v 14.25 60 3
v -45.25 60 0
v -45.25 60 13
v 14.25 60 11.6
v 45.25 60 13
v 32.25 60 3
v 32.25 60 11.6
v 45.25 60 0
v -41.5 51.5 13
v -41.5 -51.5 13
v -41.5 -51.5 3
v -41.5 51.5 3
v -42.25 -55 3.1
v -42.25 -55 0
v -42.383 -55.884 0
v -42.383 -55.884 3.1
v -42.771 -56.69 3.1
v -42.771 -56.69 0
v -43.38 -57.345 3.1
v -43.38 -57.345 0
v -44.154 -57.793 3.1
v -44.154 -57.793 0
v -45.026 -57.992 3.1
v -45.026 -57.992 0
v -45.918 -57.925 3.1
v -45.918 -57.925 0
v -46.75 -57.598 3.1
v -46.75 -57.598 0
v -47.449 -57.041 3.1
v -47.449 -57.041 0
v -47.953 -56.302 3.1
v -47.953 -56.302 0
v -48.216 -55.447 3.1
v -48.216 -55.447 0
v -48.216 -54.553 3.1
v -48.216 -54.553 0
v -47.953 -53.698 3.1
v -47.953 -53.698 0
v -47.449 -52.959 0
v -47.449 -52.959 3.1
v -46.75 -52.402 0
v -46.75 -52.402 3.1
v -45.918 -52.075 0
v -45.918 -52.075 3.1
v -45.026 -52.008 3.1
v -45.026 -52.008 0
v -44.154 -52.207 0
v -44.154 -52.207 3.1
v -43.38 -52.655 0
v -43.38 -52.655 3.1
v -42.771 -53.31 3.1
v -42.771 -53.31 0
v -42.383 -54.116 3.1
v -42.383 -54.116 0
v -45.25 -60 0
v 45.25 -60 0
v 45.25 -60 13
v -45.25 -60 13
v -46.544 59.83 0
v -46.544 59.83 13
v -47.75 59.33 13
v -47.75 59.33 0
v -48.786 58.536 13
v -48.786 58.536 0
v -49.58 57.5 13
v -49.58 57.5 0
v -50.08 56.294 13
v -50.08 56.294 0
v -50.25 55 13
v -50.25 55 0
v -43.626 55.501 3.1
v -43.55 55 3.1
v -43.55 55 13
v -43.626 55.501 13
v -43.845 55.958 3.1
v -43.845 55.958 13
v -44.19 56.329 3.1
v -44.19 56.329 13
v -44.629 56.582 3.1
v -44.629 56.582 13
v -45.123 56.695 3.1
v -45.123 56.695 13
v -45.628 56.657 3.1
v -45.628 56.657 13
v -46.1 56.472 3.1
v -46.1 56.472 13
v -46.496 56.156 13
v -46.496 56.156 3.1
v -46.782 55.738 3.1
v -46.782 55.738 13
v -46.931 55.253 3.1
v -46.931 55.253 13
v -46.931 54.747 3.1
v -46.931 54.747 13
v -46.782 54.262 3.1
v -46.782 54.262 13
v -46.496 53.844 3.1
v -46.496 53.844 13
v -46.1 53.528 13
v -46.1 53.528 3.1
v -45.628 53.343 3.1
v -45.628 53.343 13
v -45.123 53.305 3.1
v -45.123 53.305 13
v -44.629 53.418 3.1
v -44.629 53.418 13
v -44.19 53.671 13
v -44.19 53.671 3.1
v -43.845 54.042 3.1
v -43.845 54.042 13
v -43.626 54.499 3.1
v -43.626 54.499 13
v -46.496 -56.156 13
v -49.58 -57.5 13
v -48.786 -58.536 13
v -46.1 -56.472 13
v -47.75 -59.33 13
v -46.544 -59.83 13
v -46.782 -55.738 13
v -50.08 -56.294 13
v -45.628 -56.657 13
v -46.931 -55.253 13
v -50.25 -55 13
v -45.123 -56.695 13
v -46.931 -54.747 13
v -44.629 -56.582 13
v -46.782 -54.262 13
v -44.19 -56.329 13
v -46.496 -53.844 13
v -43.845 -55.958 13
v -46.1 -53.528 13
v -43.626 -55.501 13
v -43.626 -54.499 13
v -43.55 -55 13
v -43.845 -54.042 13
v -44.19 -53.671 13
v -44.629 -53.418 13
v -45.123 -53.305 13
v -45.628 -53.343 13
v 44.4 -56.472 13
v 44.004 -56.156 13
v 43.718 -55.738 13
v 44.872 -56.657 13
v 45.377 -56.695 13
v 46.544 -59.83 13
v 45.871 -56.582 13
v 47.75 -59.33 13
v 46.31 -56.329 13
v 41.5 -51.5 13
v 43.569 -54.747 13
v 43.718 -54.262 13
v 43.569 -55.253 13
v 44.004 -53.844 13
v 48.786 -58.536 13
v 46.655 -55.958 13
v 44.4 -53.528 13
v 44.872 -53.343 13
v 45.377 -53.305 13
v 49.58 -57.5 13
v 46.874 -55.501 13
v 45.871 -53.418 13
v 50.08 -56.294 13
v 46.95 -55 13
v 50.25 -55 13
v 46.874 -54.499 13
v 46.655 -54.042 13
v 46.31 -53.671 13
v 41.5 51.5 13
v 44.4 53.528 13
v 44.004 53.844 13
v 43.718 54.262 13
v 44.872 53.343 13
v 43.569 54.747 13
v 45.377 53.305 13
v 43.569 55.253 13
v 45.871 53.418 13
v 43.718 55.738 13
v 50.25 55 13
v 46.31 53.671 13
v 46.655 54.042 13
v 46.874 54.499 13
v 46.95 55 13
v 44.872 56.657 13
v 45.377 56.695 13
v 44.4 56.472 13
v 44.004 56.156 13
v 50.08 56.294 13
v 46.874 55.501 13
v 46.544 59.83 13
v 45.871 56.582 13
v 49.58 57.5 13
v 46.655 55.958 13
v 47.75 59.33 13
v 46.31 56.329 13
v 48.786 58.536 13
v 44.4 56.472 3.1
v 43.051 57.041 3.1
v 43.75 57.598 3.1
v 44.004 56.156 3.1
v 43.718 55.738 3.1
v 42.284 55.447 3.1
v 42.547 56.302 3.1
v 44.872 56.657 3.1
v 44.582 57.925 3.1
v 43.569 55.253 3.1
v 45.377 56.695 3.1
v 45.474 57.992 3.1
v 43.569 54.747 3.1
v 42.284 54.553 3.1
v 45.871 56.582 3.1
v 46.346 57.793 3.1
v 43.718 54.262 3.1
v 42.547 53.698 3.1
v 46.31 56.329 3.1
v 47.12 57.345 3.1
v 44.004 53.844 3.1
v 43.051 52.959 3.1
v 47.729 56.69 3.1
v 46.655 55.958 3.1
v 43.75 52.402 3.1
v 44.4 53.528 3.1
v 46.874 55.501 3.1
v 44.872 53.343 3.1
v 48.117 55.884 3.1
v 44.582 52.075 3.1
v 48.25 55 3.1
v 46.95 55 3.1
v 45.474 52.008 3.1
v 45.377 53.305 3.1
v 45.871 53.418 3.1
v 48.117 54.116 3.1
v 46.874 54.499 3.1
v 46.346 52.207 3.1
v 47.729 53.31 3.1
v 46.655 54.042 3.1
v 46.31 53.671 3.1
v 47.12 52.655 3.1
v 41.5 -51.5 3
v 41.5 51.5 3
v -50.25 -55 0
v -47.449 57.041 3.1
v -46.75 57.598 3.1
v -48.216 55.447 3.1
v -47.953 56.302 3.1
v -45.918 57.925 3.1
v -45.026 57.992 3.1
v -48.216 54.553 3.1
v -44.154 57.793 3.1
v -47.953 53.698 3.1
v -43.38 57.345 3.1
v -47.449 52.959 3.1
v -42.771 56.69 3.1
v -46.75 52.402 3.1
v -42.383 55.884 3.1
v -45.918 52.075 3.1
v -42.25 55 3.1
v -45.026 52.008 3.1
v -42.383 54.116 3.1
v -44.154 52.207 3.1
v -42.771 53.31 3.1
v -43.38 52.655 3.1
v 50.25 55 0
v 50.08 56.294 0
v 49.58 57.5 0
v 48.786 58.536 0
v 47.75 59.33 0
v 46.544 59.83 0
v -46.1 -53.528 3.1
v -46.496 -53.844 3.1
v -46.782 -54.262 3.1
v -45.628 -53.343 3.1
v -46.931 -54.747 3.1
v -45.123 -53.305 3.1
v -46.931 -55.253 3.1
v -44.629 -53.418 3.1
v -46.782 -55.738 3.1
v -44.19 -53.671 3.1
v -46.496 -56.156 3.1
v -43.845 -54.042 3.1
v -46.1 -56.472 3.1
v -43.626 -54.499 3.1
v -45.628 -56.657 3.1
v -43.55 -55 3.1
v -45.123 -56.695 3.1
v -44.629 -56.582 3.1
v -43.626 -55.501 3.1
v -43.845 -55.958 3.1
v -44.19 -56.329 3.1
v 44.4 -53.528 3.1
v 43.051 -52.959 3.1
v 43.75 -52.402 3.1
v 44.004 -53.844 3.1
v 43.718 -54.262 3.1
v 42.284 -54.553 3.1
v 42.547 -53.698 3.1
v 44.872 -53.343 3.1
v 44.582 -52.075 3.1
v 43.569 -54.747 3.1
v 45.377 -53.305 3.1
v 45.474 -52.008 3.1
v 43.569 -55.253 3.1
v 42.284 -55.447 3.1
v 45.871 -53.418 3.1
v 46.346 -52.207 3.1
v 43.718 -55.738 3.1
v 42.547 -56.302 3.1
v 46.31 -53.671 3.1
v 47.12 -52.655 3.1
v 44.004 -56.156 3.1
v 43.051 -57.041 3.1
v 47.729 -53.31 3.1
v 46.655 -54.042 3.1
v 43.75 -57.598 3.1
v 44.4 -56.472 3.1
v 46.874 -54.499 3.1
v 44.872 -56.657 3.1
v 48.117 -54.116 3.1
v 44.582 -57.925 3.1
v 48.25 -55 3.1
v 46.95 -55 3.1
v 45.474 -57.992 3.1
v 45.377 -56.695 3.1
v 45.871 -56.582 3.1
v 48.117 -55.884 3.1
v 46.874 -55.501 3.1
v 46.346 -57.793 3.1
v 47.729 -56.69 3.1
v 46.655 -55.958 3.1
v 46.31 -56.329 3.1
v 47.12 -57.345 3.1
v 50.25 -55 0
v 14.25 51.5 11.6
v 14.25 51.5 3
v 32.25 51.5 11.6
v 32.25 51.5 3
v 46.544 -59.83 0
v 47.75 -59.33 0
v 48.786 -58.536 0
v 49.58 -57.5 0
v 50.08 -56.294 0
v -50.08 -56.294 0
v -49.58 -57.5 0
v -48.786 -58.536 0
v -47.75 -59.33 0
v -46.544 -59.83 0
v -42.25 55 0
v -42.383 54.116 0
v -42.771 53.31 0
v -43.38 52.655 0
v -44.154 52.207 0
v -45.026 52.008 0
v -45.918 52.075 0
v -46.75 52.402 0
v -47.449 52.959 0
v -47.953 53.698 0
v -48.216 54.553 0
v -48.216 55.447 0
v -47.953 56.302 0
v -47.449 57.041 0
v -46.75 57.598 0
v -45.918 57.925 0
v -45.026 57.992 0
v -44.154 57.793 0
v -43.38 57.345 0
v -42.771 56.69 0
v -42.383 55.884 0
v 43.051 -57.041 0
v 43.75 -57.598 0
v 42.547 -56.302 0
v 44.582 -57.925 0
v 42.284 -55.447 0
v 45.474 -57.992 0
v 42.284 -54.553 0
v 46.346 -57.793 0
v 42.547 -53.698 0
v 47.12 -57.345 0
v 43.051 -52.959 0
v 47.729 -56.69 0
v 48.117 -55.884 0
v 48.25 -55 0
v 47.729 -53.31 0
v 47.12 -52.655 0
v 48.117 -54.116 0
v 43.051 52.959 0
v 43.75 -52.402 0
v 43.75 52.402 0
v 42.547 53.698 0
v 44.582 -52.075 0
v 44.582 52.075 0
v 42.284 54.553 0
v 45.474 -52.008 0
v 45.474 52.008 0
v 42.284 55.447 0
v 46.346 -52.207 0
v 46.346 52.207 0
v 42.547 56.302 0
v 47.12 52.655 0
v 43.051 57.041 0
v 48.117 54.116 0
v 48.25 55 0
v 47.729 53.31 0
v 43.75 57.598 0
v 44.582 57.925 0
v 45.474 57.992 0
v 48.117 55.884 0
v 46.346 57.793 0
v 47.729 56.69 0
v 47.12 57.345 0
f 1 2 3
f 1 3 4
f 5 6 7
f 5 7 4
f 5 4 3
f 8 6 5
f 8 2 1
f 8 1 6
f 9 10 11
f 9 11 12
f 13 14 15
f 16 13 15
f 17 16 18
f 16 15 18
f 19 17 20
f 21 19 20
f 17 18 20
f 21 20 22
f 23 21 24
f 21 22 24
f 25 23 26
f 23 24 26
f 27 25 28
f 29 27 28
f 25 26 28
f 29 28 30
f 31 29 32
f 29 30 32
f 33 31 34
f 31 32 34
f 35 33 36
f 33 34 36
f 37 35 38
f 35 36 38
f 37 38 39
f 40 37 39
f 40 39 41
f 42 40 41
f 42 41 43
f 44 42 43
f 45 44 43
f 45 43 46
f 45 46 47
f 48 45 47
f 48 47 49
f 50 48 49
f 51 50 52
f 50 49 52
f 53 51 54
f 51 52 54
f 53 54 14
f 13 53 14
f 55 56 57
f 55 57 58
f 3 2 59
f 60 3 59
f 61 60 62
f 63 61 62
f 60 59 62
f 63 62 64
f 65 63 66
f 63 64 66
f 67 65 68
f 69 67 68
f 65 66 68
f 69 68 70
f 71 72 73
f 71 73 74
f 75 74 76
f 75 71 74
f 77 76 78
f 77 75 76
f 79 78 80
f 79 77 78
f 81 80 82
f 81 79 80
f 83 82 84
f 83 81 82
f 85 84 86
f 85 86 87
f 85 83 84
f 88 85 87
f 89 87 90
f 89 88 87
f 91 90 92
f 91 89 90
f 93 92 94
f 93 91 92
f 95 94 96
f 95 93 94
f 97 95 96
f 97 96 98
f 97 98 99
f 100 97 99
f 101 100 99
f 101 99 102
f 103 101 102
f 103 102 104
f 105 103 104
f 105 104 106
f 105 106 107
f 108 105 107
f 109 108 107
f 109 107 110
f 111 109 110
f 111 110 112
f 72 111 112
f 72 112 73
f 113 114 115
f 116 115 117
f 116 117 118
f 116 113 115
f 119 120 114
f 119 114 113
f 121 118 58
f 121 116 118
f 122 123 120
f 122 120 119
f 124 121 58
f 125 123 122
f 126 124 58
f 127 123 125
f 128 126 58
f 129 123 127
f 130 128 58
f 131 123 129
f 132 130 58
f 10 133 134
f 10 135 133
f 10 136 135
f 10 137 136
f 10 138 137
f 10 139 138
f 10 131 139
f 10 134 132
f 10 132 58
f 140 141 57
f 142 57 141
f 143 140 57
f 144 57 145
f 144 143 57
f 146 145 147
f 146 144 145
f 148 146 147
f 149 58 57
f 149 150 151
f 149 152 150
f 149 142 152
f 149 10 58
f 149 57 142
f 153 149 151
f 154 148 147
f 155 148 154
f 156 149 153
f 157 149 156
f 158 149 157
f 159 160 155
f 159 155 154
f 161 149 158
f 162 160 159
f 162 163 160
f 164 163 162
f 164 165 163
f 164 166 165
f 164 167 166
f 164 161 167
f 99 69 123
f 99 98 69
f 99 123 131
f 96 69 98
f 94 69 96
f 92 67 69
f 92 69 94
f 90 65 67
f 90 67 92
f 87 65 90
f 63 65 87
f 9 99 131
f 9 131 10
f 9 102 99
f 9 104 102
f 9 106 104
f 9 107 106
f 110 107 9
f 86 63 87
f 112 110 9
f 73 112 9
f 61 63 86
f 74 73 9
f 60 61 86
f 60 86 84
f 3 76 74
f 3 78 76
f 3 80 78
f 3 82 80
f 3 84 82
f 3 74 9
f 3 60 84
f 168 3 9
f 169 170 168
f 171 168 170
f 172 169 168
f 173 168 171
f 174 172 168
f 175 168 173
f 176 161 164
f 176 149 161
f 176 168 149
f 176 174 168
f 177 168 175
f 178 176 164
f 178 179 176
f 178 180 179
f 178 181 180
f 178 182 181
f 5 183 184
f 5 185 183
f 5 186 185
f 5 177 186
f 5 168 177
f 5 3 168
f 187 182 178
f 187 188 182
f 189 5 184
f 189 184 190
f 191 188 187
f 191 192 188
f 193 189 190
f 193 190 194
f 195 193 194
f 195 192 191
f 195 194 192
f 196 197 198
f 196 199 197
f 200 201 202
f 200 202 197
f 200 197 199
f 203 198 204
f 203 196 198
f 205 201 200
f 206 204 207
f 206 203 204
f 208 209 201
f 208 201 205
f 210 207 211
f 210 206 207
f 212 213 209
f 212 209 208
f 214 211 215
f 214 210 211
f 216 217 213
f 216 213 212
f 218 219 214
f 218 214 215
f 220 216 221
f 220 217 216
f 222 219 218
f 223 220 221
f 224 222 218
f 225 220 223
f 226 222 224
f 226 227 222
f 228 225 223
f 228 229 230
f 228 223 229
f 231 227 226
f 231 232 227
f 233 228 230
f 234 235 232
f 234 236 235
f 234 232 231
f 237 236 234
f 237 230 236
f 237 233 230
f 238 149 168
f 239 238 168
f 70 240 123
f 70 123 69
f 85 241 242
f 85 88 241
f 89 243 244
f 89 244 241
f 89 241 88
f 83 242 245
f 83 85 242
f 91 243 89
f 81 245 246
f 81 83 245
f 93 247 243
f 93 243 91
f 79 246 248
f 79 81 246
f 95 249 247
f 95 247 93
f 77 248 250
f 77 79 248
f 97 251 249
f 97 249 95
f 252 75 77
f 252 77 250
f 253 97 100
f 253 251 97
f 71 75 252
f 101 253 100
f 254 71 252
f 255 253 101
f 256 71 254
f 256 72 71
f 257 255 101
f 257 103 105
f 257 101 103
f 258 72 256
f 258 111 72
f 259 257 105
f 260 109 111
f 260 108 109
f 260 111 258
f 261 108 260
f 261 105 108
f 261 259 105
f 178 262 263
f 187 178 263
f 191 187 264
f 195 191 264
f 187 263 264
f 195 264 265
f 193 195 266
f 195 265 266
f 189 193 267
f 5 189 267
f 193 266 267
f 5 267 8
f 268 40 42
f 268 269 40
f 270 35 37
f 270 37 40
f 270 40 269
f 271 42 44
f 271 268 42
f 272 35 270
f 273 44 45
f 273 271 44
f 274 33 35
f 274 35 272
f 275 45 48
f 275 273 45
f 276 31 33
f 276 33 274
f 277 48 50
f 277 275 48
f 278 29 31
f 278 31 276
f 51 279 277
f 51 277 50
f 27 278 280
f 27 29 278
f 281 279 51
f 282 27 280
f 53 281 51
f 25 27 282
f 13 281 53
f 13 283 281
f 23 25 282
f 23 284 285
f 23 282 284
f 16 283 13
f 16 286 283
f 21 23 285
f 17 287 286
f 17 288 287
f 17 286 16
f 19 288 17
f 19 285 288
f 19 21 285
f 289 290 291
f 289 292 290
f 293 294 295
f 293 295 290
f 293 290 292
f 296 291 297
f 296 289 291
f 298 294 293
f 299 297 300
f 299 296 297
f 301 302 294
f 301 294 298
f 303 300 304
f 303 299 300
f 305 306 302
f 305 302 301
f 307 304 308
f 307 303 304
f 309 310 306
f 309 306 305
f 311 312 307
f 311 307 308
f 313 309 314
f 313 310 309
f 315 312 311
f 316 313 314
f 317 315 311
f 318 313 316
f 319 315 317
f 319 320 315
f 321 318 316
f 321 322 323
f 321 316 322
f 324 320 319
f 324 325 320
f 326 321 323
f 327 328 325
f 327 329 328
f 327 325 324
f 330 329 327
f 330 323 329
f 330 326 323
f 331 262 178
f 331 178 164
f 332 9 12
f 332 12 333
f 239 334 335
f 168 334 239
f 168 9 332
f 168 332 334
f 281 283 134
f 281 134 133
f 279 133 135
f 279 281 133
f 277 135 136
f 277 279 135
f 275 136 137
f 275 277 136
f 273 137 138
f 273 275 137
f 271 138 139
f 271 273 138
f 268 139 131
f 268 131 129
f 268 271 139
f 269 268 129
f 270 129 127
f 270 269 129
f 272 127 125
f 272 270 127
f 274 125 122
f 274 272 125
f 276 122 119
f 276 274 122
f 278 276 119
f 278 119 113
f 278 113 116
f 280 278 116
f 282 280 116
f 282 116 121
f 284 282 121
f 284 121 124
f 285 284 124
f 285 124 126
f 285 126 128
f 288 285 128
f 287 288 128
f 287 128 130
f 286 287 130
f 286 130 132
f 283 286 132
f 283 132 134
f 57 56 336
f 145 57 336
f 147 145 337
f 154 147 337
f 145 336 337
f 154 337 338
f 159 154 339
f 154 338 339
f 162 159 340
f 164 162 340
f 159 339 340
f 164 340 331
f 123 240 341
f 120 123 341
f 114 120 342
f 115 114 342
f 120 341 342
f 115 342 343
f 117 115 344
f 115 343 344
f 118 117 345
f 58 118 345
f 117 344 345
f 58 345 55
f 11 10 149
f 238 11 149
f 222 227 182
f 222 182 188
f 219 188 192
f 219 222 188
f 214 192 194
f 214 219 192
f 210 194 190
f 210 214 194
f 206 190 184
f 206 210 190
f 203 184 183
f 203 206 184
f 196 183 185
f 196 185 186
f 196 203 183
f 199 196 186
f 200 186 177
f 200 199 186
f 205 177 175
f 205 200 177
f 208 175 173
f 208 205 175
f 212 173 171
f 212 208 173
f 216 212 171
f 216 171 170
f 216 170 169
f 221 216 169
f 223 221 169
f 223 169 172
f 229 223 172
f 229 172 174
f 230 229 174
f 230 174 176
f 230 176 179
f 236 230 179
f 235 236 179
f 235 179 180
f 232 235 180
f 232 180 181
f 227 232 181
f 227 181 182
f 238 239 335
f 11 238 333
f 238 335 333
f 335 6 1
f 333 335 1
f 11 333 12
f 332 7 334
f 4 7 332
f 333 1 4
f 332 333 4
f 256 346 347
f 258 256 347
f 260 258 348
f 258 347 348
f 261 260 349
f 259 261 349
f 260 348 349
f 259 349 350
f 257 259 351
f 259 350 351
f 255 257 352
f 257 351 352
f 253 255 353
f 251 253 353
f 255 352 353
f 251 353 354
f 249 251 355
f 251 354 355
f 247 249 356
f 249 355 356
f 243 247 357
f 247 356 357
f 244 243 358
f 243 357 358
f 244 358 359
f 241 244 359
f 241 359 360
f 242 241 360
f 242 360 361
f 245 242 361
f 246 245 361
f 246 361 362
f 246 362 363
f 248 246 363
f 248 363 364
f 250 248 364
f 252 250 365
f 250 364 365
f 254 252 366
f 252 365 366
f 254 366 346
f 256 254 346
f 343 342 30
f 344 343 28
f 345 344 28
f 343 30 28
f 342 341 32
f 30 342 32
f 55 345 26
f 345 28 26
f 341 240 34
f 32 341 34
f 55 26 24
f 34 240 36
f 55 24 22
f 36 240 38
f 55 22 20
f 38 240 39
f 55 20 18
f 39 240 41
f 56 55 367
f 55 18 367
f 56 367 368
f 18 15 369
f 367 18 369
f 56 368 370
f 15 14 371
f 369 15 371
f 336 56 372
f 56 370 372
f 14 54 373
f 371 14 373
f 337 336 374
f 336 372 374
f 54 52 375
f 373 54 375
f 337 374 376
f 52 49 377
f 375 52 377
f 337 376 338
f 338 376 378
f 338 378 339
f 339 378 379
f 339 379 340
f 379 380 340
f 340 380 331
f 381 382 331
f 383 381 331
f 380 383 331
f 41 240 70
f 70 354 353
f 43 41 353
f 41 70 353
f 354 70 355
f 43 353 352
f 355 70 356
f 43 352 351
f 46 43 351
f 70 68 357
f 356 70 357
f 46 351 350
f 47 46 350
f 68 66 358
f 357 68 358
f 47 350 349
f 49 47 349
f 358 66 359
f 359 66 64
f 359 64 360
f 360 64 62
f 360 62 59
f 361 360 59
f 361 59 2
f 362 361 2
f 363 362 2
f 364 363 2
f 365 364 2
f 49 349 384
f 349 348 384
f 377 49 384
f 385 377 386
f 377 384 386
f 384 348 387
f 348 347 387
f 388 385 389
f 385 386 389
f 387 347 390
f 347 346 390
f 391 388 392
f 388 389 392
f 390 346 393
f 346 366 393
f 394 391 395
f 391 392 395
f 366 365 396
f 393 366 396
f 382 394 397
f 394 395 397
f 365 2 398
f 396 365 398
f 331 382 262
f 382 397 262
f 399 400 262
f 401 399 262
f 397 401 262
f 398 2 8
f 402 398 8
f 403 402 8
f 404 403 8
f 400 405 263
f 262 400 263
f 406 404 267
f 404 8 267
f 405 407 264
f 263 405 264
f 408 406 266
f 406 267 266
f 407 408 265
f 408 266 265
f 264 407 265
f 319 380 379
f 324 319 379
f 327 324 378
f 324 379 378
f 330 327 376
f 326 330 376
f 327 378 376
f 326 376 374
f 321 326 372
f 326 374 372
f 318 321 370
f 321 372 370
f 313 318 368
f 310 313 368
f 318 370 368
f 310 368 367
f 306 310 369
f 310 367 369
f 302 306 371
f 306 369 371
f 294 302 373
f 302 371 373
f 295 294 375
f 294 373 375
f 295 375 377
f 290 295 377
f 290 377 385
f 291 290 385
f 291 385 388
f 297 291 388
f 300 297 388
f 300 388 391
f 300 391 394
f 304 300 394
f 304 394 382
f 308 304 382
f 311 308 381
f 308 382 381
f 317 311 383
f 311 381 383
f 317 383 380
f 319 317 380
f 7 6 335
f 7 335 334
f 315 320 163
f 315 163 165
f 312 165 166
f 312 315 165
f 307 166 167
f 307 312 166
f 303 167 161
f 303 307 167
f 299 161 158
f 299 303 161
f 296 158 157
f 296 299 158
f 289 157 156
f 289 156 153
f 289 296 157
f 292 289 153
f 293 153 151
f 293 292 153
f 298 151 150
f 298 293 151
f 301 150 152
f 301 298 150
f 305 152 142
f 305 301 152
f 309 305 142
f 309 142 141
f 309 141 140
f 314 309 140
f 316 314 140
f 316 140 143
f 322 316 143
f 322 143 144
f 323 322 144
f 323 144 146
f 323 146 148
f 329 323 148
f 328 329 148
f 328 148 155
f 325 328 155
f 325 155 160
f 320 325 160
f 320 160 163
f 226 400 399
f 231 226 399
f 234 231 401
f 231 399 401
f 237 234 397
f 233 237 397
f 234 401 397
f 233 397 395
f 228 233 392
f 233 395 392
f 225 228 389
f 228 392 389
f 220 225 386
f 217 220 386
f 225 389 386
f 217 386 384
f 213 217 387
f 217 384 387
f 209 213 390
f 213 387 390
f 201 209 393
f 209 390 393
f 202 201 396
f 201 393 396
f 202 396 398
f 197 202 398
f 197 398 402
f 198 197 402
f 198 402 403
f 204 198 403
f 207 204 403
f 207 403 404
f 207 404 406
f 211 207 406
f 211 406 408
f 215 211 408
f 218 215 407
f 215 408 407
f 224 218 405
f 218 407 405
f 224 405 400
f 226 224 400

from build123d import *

# Parameters (mm, degrees)
SKETCH_R        = 1.7
PAD_DEPTH       = 13
SKETCH001_W     = 83
SKETCH001_H     = 103
POCKET_DEPTH    = 10
SKETCH002_W     = 18
SKETCH002_H     = 8.6
POCKET001_DEPTH = 11
SKETCH004_R     = 3
POCKET002_DEPTH = 3.1
SKETCH006_R     = 3
POCKET003_DEPTH = 3.1
SKETCH007_R     = 3
POCKET004_DEPTH = 3.1
SKETCH005_R     = 3
POCKET005_DEPTH = 3.1


with BuildPart() as part:
    # Sketch → Pad (new body)
    with BuildSketch(Plane.XY):
        with BuildLine():
            ThreePointArc((-45.25, 60), (-48.785534, 58.535534), (-50.25, 55))
            Line((-50.25, -55), (-50.25, 55))
            ThreePointArc((-50.25, -55), (-48.785534, -58.535534), (-45.25, -60))
            Line((45.25, -60), (-45.25, -60))
            ThreePointArc((45.25, -60), (48.785534, -58.535534), (50.25, -55))
            Line((50.25, 55), (50.25, -55))
            ThreePointArc((50.25, 55), (48.785534, 58.535534), (45.25, 60))
            Line((-45.25, 60), (45.25, 60))
        make_face()
        with Locations((-45.25, 55)):
            Circle(SKETCH_R, mode=Mode.SUBTRACT)
        with Locations((45.25, 55)):
            Circle(SKETCH_R, mode=Mode.SUBTRACT)
        with Locations((45.25, -55)):
            Circle(SKETCH_R, mode=Mode.SUBTRACT)
        with Locations((-45.25, -55)):
            Circle(SKETCH_R, mode=Mode.SUBTRACT)
    extrude(amount=PAD_DEPTH)

    # Sketch001 (on Face14 of Pad) → Pocket (cut)
    with BuildSketch(Plane.XY.offset(13)):
        Rectangle(SKETCH001_W, SKETCH001_H)
    extrude(amount=-POCKET_DEPTH, mode=Mode.SUBTRACT)

    # Sketch002 (on Face2 of Pocket) → Pocket001 (cut)
    with BuildSketch(Plane(origin=(0, 60, 0), x_dir=(-1, 0, 0), z_dir=(0, 1, 0))):
        with Locations((-23.25, 7.3)):
            Rectangle(SKETCH002_W, SKETCH002_H)
    extrude(amount=-POCKET001_DEPTH, mode=Mode.SUBTRACT)

    # Sketch004 (on Face4 of Pocket001) → Pocket002 (cut)
    with BuildSketch(Plane(origin=(0, 0, 0), x_dir=(1, 0, 0), z_dir=(0, 0, -1))):
        with Locations((-45.25, -55)):
            Circle(SKETCH004_R)
    extrude(amount=-POCKET002_DEPTH, mode=Mode.SUBTRACT)

    # Sketch006 (on Face4 of Pocket001) → Pocket003 (cut)
    with BuildSketch(Plane(origin=(0, 0, 0), x_dir=(1, 0, 0), z_dir=(0, 0, -1))):
        with Locations((-45.25, 55)):
            Circle(SKETCH006_R)
    extrude(amount=-POCKET003_DEPTH, mode=Mode.SUBTRACT)

    # Sketch007 (on Face4 of Pocket001) → Pocket004 (cut)
    with BuildSketch(Plane(origin=(0, 0, 0), x_dir=(1, 0, 0), z_dir=(0, 0, -1))):
        with Locations((45.25, 55)):
            Circle(SKETCH007_R)
    extrude(amount=-POCKET004_DEPTH, mode=Mode.SUBTRACT)

    # Sketch005 (on Face4 of Pocket001) → Pocket005 (cut)
    with BuildSketch(Plane(origin=(0, 0, 0), x_dir=(1, 0, 0), z_dir=(0, 0, -1))):
        with Locations((45.25, -55)):
            Circle(SKETCH005_R)
    extrude(amount=-POCKET005_DEPTH, mode=Mode.SUBTRACT)


solid = part.part
